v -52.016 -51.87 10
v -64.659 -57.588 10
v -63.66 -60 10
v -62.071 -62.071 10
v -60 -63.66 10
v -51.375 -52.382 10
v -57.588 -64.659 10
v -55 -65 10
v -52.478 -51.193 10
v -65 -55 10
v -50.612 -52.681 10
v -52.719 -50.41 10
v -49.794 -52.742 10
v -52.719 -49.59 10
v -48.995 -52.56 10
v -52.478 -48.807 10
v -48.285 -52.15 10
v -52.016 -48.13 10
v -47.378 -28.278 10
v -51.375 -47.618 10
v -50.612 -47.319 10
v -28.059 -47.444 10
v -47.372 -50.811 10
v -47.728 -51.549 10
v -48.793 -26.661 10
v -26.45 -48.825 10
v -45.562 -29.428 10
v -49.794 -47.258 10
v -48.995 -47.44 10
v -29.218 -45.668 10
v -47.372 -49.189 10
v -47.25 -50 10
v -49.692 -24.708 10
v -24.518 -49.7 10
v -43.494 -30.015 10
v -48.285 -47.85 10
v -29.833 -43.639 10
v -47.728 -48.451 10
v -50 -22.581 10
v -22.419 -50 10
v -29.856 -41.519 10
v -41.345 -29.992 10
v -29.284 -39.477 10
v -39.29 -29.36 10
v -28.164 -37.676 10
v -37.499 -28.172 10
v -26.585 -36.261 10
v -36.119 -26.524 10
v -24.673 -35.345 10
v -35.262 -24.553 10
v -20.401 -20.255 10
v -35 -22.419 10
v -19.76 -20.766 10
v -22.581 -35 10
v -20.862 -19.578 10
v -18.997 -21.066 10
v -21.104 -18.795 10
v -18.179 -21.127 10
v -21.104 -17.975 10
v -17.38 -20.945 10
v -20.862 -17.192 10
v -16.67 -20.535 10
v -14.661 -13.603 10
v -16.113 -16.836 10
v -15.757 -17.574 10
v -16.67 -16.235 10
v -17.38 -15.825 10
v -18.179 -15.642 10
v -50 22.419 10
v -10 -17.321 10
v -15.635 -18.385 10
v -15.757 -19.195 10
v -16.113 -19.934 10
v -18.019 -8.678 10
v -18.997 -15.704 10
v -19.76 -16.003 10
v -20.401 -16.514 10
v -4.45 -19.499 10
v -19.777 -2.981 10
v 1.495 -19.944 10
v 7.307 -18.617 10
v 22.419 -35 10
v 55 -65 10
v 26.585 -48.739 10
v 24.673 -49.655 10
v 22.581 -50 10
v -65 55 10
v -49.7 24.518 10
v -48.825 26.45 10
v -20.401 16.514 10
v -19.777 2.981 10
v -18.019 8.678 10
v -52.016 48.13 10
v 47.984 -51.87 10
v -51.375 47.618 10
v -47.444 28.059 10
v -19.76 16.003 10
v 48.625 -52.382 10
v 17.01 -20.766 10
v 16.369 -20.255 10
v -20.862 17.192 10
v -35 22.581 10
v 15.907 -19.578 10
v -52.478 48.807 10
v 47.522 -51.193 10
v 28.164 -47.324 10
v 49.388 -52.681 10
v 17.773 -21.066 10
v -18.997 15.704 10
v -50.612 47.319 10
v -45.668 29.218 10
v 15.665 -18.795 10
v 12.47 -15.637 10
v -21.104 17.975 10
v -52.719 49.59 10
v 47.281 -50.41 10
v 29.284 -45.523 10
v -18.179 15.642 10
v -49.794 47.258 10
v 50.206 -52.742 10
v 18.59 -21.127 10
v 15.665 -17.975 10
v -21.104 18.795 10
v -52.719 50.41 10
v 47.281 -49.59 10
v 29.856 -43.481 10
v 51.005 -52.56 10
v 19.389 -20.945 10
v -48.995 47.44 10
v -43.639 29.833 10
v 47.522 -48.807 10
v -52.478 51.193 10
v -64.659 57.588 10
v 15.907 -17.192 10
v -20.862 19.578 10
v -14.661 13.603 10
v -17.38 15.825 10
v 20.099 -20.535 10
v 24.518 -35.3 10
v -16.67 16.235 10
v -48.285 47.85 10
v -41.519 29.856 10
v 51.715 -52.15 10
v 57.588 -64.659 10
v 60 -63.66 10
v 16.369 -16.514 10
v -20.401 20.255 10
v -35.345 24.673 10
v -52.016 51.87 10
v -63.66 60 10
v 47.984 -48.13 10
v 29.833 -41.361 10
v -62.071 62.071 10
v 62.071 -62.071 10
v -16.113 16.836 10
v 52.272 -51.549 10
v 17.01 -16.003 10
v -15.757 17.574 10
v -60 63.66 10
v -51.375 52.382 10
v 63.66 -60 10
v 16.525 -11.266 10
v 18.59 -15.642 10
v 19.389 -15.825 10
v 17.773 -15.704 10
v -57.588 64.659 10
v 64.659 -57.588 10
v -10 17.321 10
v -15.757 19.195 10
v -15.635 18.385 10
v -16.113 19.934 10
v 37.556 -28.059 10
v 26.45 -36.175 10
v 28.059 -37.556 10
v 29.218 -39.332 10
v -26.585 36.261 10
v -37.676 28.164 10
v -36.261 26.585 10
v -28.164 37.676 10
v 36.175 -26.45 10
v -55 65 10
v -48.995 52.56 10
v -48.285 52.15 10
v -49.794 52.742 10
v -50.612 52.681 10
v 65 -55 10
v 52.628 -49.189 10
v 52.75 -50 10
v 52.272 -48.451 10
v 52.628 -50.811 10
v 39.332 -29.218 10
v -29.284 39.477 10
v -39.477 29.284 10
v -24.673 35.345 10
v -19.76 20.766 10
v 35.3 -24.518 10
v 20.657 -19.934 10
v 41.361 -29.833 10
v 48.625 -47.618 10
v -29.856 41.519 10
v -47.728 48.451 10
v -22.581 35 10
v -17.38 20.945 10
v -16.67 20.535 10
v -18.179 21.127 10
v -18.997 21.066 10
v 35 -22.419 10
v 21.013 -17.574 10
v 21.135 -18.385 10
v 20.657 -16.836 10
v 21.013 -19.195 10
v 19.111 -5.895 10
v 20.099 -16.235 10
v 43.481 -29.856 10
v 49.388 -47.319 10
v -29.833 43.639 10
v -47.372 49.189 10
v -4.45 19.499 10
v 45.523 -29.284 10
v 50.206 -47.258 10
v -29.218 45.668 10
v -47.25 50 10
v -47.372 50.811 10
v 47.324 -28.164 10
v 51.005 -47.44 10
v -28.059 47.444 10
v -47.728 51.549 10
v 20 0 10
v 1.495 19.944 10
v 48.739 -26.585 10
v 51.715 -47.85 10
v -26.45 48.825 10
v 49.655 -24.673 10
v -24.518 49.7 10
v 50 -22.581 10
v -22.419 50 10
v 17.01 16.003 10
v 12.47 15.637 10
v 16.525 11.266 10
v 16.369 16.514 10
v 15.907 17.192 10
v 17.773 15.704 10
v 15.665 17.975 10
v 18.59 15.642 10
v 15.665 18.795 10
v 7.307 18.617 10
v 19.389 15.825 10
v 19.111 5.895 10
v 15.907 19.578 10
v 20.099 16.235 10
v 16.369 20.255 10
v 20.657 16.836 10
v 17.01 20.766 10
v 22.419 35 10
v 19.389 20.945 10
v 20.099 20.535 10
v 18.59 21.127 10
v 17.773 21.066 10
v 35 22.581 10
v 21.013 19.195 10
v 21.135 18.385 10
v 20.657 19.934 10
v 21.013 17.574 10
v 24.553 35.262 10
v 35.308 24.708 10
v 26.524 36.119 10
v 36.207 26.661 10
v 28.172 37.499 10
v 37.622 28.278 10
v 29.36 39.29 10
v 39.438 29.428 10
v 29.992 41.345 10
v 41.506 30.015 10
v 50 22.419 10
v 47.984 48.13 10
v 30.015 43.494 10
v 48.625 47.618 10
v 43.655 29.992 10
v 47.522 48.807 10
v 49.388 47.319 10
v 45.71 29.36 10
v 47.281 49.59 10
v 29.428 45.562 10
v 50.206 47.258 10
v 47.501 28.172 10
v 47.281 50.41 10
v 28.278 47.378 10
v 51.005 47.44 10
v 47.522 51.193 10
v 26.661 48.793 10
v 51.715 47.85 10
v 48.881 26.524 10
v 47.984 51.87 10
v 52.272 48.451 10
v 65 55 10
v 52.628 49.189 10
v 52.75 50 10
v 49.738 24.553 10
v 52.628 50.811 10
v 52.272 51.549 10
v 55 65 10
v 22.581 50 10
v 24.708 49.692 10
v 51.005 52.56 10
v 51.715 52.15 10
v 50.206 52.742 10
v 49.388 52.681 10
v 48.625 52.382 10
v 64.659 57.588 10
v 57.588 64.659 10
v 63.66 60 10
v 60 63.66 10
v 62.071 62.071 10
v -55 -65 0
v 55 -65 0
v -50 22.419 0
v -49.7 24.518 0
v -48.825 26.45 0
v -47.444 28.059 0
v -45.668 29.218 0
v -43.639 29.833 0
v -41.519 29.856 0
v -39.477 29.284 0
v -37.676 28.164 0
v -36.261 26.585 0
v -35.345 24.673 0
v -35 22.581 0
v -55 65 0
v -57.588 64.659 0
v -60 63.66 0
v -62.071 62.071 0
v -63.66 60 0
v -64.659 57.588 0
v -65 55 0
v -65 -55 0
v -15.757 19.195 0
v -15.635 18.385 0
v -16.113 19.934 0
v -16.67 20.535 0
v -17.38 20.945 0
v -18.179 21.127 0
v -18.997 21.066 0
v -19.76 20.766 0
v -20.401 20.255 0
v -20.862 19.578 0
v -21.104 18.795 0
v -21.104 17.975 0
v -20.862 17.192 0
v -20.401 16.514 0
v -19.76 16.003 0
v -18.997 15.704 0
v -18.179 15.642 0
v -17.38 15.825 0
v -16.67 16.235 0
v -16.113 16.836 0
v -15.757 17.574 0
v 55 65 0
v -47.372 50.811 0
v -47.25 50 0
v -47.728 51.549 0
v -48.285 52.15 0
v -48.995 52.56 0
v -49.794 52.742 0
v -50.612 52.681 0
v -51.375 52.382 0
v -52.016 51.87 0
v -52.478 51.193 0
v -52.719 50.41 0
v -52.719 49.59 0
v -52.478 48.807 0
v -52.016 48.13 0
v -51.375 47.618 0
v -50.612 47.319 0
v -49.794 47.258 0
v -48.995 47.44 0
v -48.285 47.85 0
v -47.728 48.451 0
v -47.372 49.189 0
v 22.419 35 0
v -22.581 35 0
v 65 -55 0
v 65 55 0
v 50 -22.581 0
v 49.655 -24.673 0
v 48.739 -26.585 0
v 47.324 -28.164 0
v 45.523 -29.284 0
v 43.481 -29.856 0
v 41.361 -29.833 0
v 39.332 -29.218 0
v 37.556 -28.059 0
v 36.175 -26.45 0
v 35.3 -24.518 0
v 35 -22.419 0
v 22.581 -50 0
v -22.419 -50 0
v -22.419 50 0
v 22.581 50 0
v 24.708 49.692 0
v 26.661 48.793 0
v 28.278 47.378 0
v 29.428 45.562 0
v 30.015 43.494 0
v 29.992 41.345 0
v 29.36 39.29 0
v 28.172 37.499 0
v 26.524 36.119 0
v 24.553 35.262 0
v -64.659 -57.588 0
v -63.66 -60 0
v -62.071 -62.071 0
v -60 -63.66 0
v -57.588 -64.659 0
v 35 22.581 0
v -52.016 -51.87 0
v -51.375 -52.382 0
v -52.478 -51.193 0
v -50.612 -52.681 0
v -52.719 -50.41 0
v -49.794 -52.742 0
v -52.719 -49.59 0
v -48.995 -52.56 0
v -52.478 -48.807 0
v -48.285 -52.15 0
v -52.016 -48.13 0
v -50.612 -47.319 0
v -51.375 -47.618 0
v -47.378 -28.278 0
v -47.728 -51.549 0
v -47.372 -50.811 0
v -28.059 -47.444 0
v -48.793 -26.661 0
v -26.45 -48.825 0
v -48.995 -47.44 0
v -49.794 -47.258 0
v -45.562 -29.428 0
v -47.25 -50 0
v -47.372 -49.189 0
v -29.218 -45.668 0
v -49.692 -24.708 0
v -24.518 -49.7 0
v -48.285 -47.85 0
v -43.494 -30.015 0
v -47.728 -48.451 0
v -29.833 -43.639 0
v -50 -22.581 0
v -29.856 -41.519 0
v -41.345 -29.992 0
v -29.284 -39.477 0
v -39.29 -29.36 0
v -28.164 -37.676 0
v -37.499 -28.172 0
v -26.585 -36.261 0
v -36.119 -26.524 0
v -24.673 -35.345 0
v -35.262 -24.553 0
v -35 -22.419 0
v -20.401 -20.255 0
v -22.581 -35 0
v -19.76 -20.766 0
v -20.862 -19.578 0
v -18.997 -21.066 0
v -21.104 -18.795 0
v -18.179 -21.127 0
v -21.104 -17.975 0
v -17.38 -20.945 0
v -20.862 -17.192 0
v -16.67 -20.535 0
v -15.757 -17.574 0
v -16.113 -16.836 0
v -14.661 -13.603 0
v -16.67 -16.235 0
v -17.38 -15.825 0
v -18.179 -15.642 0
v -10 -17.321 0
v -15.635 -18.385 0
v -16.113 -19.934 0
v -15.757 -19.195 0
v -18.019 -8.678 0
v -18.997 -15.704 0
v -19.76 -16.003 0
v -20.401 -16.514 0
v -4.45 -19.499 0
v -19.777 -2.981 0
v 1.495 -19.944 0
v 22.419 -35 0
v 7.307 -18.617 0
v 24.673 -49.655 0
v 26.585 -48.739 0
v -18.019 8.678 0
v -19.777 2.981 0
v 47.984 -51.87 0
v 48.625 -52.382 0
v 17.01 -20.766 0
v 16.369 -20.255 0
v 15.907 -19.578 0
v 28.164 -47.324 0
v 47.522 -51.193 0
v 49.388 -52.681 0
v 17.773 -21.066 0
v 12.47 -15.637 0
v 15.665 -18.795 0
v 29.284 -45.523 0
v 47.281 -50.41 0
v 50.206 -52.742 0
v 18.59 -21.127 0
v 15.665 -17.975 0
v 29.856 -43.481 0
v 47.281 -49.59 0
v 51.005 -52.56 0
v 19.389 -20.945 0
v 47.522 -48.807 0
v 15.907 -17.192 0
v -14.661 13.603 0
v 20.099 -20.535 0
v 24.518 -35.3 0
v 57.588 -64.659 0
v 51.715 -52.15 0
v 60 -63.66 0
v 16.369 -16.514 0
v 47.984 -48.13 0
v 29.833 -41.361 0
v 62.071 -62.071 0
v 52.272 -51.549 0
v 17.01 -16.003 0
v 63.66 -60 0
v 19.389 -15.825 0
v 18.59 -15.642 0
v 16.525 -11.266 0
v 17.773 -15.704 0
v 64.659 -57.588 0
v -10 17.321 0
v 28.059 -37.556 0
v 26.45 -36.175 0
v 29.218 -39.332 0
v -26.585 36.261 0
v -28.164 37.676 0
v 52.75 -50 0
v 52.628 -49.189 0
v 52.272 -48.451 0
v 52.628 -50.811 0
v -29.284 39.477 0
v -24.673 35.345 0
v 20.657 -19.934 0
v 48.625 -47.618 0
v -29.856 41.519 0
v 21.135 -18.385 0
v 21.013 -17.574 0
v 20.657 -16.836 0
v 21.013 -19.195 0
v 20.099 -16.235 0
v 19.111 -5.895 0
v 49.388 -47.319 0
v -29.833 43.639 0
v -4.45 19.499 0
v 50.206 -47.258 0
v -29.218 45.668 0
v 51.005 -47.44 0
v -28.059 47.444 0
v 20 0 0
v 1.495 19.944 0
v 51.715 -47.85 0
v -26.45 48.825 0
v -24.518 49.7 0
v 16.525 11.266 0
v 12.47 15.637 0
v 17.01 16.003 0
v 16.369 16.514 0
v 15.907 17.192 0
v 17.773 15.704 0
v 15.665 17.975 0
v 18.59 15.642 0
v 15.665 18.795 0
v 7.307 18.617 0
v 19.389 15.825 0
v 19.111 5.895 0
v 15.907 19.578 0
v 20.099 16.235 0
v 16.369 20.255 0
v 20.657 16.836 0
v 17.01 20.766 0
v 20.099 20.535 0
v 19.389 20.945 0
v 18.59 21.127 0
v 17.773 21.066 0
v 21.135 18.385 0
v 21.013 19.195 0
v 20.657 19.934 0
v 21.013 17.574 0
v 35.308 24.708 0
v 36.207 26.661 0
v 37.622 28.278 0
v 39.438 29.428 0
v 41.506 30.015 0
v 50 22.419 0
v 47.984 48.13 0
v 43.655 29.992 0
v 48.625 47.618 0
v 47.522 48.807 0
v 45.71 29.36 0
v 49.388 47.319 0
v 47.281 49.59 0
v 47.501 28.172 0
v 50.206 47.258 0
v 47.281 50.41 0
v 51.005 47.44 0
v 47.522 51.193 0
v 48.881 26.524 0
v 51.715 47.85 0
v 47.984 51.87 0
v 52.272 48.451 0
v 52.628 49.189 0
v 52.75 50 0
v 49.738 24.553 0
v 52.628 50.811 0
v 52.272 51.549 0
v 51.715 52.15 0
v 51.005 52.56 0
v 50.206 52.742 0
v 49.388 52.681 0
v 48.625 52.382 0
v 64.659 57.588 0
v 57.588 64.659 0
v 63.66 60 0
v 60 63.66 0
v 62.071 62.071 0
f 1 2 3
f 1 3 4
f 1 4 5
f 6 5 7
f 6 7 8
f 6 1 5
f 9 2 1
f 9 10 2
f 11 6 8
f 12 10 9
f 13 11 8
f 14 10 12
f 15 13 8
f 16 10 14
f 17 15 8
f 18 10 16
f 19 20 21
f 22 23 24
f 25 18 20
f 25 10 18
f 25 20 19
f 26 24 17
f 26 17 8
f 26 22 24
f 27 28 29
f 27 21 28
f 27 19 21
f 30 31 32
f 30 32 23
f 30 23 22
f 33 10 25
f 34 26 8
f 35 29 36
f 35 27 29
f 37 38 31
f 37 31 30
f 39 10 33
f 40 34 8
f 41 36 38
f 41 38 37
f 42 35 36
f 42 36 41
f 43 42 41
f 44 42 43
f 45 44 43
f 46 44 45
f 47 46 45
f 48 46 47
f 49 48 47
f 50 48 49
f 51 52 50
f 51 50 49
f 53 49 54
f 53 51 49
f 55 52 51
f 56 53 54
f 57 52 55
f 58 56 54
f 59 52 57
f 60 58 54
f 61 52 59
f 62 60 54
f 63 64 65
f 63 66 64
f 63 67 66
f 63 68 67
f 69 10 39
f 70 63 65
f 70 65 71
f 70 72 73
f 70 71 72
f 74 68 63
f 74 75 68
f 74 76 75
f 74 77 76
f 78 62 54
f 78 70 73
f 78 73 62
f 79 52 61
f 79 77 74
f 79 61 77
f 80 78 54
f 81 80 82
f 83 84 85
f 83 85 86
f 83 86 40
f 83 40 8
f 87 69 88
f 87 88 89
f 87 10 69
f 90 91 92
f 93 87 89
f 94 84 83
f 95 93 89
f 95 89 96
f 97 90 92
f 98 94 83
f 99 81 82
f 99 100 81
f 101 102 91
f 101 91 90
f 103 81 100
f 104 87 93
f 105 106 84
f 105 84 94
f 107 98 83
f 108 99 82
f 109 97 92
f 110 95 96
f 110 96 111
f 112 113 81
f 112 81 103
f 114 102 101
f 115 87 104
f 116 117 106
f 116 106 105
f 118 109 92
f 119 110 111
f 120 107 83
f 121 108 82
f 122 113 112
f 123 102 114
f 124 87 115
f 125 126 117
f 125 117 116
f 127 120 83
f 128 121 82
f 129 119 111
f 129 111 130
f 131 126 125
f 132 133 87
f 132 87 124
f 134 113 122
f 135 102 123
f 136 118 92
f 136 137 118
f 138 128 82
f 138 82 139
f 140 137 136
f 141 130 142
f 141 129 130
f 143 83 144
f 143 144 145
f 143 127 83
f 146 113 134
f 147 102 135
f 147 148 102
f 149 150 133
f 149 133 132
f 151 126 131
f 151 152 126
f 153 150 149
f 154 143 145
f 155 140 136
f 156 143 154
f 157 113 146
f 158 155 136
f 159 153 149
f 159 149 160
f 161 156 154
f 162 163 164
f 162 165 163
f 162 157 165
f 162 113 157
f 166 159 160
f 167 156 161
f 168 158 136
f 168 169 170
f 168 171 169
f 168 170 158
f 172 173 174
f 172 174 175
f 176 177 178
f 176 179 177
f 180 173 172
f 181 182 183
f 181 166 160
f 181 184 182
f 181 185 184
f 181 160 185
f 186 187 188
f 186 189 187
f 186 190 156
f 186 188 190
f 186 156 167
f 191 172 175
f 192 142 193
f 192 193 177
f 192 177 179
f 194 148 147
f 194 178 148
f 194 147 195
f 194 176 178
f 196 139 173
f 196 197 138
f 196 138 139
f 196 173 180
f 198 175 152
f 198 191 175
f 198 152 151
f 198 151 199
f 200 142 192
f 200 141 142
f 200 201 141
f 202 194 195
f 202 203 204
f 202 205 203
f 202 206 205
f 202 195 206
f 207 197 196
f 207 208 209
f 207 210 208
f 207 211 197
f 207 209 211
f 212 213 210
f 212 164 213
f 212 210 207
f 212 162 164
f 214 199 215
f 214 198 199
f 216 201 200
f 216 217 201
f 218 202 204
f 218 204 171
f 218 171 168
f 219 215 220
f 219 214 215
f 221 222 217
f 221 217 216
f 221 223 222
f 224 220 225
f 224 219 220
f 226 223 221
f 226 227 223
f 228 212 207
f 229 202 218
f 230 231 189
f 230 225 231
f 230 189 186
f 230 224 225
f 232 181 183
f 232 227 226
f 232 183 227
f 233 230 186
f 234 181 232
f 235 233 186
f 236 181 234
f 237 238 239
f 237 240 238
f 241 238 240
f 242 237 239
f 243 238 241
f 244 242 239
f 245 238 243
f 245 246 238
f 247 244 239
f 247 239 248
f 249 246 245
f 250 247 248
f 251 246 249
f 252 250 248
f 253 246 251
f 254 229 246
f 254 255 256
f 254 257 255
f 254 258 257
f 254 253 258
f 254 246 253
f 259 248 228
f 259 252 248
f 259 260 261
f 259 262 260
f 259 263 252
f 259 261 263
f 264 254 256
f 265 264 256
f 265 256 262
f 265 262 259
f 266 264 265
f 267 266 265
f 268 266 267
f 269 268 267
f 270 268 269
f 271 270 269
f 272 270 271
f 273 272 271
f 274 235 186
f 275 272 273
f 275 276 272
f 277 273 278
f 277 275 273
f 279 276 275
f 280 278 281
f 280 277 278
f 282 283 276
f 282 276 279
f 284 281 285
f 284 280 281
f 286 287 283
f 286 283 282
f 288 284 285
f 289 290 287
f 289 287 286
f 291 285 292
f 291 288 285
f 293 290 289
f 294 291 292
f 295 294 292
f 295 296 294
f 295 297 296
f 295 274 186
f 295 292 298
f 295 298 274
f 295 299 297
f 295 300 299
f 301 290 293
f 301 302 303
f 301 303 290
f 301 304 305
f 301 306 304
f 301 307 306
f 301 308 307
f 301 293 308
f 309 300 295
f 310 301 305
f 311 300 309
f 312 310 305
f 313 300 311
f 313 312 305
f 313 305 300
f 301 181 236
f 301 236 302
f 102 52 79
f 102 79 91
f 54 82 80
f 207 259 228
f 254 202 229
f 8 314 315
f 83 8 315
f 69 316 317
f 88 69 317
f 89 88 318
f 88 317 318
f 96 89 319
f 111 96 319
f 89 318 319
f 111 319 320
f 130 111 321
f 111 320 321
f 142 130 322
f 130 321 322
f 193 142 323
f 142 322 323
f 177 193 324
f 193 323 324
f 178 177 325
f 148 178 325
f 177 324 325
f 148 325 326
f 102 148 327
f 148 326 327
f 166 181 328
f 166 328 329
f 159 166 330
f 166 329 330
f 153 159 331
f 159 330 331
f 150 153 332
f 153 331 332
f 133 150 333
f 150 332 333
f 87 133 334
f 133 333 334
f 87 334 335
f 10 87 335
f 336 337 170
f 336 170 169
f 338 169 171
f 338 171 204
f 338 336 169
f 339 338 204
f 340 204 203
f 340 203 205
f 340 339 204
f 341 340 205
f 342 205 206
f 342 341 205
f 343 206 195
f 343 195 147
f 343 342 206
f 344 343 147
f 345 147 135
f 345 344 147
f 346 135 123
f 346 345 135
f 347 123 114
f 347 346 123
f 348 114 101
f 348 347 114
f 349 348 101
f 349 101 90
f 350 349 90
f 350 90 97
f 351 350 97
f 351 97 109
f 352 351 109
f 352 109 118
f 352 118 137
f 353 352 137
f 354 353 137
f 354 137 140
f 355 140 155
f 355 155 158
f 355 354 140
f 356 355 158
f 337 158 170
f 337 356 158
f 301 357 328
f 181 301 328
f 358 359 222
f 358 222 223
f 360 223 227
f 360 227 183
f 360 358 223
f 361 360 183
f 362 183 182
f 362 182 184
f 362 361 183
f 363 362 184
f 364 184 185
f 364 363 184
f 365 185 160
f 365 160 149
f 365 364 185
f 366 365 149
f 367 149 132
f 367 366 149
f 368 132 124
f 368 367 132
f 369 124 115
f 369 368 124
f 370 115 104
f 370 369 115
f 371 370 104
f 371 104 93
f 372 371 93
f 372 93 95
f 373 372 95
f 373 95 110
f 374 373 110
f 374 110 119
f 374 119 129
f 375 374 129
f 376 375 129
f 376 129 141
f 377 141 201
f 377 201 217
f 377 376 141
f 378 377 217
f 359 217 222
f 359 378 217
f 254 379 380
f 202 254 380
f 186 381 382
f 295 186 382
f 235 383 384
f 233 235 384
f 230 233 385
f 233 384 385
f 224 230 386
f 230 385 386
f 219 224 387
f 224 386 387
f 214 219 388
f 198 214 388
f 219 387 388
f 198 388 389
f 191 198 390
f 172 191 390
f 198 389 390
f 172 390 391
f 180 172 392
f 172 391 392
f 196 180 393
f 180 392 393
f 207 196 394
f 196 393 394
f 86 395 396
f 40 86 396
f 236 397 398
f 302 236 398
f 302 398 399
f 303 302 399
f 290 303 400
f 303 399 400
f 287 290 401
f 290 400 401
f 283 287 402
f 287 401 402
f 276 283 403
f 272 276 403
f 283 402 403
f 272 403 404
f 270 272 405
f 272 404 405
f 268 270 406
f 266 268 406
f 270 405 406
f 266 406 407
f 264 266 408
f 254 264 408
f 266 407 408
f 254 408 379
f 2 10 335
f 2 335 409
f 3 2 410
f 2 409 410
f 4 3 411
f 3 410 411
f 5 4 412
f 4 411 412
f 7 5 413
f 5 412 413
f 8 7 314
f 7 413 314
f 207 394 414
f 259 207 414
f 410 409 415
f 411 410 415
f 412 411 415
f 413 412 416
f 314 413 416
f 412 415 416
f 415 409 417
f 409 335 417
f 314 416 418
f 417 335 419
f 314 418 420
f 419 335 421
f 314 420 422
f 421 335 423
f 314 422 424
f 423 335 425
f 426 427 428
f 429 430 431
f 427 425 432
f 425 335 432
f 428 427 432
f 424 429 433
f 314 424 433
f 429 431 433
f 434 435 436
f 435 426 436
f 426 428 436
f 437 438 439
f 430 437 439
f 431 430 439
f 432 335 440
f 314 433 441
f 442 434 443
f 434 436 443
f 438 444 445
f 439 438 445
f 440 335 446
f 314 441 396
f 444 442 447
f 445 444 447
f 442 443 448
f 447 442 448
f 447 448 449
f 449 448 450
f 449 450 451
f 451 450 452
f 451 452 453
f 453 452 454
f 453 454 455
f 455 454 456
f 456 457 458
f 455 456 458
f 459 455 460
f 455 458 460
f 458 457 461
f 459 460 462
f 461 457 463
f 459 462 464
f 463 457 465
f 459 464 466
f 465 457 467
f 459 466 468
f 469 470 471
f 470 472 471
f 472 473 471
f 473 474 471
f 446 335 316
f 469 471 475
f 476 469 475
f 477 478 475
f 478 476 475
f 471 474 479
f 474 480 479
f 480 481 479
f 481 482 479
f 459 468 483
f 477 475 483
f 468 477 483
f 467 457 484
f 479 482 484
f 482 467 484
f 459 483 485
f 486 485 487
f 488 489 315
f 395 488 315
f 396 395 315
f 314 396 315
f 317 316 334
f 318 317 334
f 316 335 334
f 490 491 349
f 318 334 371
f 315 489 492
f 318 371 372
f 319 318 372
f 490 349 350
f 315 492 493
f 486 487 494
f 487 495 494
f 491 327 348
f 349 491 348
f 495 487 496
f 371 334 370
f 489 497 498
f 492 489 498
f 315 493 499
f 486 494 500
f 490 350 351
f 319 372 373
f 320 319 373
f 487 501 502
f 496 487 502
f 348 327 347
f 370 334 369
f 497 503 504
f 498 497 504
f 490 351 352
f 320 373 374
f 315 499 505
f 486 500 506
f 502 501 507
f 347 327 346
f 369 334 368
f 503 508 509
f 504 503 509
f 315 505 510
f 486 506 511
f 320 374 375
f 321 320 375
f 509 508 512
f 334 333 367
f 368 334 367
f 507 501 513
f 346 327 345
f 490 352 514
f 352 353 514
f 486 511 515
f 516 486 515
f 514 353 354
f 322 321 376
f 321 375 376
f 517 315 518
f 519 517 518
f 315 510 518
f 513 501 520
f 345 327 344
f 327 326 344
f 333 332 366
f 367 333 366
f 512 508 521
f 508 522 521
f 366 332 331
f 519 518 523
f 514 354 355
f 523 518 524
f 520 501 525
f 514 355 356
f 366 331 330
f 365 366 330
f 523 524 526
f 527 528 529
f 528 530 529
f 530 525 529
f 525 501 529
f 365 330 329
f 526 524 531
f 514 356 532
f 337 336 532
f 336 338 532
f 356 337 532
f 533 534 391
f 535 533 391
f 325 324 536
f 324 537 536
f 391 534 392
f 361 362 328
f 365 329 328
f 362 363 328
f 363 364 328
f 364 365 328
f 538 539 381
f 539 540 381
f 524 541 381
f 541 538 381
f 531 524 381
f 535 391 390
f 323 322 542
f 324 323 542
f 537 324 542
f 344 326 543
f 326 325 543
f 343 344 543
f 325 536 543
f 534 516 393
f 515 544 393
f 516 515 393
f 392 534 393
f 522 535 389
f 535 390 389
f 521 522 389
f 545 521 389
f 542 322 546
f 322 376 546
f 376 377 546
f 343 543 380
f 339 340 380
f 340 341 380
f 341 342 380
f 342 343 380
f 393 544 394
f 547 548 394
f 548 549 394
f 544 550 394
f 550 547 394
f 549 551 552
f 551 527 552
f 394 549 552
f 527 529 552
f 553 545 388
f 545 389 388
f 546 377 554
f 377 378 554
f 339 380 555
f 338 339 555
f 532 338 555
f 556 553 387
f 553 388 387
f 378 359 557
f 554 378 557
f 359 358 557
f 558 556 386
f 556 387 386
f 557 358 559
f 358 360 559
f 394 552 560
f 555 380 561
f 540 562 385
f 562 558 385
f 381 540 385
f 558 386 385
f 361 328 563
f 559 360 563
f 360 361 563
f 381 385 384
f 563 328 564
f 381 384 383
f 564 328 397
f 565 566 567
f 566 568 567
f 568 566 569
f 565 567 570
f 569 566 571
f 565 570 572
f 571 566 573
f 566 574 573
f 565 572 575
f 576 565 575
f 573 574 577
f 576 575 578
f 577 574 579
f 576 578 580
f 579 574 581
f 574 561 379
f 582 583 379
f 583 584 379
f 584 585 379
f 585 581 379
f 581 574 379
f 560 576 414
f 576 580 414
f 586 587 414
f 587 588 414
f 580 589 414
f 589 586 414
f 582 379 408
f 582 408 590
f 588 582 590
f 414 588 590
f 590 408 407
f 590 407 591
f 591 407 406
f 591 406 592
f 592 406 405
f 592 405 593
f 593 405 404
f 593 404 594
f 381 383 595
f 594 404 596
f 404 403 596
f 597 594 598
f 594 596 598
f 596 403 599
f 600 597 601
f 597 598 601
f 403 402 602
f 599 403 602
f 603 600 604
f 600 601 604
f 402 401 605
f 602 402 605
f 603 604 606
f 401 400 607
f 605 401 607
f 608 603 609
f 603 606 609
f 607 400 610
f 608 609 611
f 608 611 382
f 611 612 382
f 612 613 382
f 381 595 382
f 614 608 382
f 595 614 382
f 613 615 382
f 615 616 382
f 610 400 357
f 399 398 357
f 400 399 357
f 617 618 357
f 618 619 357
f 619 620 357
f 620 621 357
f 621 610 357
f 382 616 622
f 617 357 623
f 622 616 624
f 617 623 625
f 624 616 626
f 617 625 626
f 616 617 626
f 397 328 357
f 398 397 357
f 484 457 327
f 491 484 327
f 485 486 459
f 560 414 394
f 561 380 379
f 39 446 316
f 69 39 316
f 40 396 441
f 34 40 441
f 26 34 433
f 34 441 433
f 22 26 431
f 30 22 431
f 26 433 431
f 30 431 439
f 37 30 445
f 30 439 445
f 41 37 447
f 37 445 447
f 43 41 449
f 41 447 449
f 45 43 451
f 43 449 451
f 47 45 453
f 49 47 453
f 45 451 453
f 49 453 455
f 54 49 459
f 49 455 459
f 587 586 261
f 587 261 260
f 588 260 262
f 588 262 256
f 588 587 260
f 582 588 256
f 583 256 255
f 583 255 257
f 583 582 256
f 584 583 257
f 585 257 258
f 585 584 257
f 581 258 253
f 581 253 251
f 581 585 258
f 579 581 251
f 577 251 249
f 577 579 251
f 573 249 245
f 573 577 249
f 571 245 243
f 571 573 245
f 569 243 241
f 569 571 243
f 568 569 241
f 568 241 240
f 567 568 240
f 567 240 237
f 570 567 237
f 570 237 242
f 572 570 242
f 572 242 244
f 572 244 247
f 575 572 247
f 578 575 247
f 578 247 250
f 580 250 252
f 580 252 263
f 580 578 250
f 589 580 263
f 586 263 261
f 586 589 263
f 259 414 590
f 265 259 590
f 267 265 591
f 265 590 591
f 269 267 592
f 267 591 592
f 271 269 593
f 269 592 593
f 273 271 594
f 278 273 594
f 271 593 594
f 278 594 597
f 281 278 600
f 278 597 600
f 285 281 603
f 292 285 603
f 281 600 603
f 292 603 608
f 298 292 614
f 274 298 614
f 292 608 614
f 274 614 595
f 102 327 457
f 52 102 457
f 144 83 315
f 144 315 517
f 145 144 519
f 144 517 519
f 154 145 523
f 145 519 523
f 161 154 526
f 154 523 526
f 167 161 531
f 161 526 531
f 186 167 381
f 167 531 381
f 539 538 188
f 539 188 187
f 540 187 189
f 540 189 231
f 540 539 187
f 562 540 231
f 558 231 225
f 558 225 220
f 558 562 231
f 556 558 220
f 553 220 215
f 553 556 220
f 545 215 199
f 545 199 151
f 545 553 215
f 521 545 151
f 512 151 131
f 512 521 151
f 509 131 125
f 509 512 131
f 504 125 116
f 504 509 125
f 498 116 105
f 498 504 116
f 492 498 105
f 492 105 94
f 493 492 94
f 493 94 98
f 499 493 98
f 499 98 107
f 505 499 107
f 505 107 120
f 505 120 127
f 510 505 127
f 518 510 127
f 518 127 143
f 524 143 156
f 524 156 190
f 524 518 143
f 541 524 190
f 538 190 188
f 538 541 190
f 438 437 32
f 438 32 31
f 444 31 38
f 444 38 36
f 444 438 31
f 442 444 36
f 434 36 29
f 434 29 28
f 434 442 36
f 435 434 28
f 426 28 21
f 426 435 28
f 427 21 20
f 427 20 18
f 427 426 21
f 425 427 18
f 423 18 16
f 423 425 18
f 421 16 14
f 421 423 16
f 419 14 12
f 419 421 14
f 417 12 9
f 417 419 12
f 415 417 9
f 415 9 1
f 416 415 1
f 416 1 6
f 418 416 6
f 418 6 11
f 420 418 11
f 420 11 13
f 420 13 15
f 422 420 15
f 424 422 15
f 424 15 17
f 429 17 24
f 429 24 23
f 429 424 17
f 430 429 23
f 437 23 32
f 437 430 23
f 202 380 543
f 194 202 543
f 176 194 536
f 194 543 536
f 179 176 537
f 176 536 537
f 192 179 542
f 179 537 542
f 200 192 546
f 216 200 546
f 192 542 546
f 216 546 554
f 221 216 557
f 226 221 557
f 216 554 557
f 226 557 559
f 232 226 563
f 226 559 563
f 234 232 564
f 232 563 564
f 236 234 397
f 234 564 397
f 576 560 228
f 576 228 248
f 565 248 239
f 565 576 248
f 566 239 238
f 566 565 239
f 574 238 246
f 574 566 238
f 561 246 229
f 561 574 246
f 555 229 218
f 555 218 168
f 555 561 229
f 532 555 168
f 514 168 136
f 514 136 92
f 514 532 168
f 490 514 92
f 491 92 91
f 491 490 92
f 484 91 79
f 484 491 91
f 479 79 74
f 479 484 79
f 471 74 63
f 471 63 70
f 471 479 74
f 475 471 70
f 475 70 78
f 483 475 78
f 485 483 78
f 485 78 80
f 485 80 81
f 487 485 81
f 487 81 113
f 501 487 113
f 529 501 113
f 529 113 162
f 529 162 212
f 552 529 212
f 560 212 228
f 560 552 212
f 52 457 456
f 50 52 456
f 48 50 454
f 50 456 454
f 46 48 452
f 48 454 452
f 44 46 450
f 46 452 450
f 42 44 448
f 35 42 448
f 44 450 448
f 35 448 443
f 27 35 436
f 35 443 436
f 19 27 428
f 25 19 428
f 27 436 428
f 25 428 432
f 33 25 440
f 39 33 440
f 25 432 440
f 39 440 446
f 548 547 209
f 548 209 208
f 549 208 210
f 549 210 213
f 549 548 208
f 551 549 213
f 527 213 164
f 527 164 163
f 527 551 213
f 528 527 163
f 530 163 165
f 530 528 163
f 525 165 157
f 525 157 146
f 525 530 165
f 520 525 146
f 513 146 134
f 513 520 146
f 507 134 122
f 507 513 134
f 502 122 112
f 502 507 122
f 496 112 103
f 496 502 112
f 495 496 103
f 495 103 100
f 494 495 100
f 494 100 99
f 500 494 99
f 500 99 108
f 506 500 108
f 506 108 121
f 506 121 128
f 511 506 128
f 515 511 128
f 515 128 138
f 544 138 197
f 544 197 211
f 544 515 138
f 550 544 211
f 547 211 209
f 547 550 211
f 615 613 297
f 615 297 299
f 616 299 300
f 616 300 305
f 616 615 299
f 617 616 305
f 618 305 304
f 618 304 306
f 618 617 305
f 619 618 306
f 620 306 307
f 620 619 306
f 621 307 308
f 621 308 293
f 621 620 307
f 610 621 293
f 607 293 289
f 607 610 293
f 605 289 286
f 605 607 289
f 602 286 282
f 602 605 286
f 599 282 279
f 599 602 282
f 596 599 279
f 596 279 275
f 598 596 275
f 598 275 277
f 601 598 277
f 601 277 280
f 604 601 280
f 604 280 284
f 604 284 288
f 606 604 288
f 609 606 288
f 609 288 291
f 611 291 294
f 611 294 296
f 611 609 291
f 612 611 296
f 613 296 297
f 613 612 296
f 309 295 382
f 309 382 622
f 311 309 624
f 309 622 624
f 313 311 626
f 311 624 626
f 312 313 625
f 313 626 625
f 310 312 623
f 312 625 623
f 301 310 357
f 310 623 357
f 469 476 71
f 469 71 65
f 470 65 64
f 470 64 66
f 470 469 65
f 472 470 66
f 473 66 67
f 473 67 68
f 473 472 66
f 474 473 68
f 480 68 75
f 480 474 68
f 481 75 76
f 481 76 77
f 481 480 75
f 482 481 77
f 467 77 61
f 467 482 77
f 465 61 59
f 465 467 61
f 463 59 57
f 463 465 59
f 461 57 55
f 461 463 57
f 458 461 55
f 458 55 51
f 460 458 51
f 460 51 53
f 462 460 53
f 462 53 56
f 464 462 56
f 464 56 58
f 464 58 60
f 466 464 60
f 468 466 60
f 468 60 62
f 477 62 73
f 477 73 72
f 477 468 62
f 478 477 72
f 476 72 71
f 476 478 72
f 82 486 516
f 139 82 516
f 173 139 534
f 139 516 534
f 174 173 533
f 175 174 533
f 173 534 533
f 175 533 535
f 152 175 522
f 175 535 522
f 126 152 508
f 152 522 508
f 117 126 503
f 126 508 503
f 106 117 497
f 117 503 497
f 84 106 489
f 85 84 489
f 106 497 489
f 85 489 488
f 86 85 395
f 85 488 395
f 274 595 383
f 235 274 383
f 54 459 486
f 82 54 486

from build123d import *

# Parameters (mm, degrees)
F0_R     = 2.75
F0_R_2   = 20
F1_DEPTH = 10


with BuildPart() as f1:
    # F0 (on Top) → F1 (new body)
    with BuildSketch(Plane.XY):
        with BuildLine():
            Line((-55, -65), (55, -65))
            ThreePointArc((55, -65), (62.071068, -62.071068), (65, -55))
            Line((65, -55), (65, 55))
            ThreePointArc((65, 55), (62.071068, 62.071068), (55, 65))
            Line((55, 65), (-55, 65))
            ThreePointArc((-55, 65), (-62.071068, 62.071068), (-65, 55))
            Line((-65, 55), (-65, -55))
            ThreePointArc((-65, -55), (-62.071068, -62.071068), (-55, -65))
        make_face()
        with Locations((-50, -50)):
            Circle(F0_R, mode=Mode.SUBTRACT)
        with BuildLine():
            Line((-22.580764, -35), (22.419236, -35))
            ThreePointArc((22.419236, -35), (29.919671, -42.420101), (22.580764, -50))
            Line((22.580764, -50), (-22.419236, -50))
            ThreePointArc((-22.419236, -50), (-29.919671, -42.579899), (-22.580764, -35))
        make_face(mode=Mode.SUBTRACT)
        with BuildLine():
            Line((-35, 22.580764), (-35, -22.419236))
            ThreePointArc((-35, -22.419236), (-42.418362, -30.081198), (-50, -22.580764))
            Line((-50, -22.580764), (-50, 22.419236))
            ThreePointArc((-50, 22.419236), (-42.579899, 29.919671), (-35, 22.580764))
        make_face(mode=Mode.SUBTRACT)
        with Locations((-18.384776, -18.384776)):
            Circle(F0_R, mode=Mode.SUBTRACT)
        with Locations((50, -50)):
            Circle(F0_R, mode=Mode.SUBTRACT)
        with Locations((18.384776, -18.384776)):
            Circle(F0_R, mode=Mode.SUBTRACT)
        with Locations((-18.384776, 18.384776)):
            Circle(F0_R, mode=Mode.SUBTRACT)
        with Locations((-50, 50)):
            Circle(F0_R, mode=Mode.SUBTRACT)
        Circle(F0_R_2, mode=Mode.SUBTRACT)
        with Locations((18.384776, 18.384776)):
            Circle(F0_R, mode=Mode.SUBTRACT)
        with BuildLine():
            Line((50, 22.419236), (50, -22.580764))
            ThreePointArc((50, -22.580764), (42.420101, -29.919671), (35, -22.419236))
            Line((35, -22.419236), (35, 22.580764))
            ThreePointArc((35, 22.580764), (42.581638, 30.081198), (50, 22.419236))
        make_face(mode=Mode.SUBTRACT)
        with BuildLine():
            ThreePointArc((22.580764, 50), (30.081198, 42.418362), (22.419236, 35))
            Line((22.419236, 35), (-22.580764, 35))
            ThreePointArc((-22.580764, 35), (-29.919671, 42.579899), (-22.419236, 50))
            Line((-22.419236, 50), (22.580764, 50))
        make_face(mode=Mode.SUBTRACT)
        with Locations((50, 50)):
            Circle(F0_R, mode=Mode.SUBTRACT)
    extrude(amount=F1_DEPTH)


solid = f1.part
